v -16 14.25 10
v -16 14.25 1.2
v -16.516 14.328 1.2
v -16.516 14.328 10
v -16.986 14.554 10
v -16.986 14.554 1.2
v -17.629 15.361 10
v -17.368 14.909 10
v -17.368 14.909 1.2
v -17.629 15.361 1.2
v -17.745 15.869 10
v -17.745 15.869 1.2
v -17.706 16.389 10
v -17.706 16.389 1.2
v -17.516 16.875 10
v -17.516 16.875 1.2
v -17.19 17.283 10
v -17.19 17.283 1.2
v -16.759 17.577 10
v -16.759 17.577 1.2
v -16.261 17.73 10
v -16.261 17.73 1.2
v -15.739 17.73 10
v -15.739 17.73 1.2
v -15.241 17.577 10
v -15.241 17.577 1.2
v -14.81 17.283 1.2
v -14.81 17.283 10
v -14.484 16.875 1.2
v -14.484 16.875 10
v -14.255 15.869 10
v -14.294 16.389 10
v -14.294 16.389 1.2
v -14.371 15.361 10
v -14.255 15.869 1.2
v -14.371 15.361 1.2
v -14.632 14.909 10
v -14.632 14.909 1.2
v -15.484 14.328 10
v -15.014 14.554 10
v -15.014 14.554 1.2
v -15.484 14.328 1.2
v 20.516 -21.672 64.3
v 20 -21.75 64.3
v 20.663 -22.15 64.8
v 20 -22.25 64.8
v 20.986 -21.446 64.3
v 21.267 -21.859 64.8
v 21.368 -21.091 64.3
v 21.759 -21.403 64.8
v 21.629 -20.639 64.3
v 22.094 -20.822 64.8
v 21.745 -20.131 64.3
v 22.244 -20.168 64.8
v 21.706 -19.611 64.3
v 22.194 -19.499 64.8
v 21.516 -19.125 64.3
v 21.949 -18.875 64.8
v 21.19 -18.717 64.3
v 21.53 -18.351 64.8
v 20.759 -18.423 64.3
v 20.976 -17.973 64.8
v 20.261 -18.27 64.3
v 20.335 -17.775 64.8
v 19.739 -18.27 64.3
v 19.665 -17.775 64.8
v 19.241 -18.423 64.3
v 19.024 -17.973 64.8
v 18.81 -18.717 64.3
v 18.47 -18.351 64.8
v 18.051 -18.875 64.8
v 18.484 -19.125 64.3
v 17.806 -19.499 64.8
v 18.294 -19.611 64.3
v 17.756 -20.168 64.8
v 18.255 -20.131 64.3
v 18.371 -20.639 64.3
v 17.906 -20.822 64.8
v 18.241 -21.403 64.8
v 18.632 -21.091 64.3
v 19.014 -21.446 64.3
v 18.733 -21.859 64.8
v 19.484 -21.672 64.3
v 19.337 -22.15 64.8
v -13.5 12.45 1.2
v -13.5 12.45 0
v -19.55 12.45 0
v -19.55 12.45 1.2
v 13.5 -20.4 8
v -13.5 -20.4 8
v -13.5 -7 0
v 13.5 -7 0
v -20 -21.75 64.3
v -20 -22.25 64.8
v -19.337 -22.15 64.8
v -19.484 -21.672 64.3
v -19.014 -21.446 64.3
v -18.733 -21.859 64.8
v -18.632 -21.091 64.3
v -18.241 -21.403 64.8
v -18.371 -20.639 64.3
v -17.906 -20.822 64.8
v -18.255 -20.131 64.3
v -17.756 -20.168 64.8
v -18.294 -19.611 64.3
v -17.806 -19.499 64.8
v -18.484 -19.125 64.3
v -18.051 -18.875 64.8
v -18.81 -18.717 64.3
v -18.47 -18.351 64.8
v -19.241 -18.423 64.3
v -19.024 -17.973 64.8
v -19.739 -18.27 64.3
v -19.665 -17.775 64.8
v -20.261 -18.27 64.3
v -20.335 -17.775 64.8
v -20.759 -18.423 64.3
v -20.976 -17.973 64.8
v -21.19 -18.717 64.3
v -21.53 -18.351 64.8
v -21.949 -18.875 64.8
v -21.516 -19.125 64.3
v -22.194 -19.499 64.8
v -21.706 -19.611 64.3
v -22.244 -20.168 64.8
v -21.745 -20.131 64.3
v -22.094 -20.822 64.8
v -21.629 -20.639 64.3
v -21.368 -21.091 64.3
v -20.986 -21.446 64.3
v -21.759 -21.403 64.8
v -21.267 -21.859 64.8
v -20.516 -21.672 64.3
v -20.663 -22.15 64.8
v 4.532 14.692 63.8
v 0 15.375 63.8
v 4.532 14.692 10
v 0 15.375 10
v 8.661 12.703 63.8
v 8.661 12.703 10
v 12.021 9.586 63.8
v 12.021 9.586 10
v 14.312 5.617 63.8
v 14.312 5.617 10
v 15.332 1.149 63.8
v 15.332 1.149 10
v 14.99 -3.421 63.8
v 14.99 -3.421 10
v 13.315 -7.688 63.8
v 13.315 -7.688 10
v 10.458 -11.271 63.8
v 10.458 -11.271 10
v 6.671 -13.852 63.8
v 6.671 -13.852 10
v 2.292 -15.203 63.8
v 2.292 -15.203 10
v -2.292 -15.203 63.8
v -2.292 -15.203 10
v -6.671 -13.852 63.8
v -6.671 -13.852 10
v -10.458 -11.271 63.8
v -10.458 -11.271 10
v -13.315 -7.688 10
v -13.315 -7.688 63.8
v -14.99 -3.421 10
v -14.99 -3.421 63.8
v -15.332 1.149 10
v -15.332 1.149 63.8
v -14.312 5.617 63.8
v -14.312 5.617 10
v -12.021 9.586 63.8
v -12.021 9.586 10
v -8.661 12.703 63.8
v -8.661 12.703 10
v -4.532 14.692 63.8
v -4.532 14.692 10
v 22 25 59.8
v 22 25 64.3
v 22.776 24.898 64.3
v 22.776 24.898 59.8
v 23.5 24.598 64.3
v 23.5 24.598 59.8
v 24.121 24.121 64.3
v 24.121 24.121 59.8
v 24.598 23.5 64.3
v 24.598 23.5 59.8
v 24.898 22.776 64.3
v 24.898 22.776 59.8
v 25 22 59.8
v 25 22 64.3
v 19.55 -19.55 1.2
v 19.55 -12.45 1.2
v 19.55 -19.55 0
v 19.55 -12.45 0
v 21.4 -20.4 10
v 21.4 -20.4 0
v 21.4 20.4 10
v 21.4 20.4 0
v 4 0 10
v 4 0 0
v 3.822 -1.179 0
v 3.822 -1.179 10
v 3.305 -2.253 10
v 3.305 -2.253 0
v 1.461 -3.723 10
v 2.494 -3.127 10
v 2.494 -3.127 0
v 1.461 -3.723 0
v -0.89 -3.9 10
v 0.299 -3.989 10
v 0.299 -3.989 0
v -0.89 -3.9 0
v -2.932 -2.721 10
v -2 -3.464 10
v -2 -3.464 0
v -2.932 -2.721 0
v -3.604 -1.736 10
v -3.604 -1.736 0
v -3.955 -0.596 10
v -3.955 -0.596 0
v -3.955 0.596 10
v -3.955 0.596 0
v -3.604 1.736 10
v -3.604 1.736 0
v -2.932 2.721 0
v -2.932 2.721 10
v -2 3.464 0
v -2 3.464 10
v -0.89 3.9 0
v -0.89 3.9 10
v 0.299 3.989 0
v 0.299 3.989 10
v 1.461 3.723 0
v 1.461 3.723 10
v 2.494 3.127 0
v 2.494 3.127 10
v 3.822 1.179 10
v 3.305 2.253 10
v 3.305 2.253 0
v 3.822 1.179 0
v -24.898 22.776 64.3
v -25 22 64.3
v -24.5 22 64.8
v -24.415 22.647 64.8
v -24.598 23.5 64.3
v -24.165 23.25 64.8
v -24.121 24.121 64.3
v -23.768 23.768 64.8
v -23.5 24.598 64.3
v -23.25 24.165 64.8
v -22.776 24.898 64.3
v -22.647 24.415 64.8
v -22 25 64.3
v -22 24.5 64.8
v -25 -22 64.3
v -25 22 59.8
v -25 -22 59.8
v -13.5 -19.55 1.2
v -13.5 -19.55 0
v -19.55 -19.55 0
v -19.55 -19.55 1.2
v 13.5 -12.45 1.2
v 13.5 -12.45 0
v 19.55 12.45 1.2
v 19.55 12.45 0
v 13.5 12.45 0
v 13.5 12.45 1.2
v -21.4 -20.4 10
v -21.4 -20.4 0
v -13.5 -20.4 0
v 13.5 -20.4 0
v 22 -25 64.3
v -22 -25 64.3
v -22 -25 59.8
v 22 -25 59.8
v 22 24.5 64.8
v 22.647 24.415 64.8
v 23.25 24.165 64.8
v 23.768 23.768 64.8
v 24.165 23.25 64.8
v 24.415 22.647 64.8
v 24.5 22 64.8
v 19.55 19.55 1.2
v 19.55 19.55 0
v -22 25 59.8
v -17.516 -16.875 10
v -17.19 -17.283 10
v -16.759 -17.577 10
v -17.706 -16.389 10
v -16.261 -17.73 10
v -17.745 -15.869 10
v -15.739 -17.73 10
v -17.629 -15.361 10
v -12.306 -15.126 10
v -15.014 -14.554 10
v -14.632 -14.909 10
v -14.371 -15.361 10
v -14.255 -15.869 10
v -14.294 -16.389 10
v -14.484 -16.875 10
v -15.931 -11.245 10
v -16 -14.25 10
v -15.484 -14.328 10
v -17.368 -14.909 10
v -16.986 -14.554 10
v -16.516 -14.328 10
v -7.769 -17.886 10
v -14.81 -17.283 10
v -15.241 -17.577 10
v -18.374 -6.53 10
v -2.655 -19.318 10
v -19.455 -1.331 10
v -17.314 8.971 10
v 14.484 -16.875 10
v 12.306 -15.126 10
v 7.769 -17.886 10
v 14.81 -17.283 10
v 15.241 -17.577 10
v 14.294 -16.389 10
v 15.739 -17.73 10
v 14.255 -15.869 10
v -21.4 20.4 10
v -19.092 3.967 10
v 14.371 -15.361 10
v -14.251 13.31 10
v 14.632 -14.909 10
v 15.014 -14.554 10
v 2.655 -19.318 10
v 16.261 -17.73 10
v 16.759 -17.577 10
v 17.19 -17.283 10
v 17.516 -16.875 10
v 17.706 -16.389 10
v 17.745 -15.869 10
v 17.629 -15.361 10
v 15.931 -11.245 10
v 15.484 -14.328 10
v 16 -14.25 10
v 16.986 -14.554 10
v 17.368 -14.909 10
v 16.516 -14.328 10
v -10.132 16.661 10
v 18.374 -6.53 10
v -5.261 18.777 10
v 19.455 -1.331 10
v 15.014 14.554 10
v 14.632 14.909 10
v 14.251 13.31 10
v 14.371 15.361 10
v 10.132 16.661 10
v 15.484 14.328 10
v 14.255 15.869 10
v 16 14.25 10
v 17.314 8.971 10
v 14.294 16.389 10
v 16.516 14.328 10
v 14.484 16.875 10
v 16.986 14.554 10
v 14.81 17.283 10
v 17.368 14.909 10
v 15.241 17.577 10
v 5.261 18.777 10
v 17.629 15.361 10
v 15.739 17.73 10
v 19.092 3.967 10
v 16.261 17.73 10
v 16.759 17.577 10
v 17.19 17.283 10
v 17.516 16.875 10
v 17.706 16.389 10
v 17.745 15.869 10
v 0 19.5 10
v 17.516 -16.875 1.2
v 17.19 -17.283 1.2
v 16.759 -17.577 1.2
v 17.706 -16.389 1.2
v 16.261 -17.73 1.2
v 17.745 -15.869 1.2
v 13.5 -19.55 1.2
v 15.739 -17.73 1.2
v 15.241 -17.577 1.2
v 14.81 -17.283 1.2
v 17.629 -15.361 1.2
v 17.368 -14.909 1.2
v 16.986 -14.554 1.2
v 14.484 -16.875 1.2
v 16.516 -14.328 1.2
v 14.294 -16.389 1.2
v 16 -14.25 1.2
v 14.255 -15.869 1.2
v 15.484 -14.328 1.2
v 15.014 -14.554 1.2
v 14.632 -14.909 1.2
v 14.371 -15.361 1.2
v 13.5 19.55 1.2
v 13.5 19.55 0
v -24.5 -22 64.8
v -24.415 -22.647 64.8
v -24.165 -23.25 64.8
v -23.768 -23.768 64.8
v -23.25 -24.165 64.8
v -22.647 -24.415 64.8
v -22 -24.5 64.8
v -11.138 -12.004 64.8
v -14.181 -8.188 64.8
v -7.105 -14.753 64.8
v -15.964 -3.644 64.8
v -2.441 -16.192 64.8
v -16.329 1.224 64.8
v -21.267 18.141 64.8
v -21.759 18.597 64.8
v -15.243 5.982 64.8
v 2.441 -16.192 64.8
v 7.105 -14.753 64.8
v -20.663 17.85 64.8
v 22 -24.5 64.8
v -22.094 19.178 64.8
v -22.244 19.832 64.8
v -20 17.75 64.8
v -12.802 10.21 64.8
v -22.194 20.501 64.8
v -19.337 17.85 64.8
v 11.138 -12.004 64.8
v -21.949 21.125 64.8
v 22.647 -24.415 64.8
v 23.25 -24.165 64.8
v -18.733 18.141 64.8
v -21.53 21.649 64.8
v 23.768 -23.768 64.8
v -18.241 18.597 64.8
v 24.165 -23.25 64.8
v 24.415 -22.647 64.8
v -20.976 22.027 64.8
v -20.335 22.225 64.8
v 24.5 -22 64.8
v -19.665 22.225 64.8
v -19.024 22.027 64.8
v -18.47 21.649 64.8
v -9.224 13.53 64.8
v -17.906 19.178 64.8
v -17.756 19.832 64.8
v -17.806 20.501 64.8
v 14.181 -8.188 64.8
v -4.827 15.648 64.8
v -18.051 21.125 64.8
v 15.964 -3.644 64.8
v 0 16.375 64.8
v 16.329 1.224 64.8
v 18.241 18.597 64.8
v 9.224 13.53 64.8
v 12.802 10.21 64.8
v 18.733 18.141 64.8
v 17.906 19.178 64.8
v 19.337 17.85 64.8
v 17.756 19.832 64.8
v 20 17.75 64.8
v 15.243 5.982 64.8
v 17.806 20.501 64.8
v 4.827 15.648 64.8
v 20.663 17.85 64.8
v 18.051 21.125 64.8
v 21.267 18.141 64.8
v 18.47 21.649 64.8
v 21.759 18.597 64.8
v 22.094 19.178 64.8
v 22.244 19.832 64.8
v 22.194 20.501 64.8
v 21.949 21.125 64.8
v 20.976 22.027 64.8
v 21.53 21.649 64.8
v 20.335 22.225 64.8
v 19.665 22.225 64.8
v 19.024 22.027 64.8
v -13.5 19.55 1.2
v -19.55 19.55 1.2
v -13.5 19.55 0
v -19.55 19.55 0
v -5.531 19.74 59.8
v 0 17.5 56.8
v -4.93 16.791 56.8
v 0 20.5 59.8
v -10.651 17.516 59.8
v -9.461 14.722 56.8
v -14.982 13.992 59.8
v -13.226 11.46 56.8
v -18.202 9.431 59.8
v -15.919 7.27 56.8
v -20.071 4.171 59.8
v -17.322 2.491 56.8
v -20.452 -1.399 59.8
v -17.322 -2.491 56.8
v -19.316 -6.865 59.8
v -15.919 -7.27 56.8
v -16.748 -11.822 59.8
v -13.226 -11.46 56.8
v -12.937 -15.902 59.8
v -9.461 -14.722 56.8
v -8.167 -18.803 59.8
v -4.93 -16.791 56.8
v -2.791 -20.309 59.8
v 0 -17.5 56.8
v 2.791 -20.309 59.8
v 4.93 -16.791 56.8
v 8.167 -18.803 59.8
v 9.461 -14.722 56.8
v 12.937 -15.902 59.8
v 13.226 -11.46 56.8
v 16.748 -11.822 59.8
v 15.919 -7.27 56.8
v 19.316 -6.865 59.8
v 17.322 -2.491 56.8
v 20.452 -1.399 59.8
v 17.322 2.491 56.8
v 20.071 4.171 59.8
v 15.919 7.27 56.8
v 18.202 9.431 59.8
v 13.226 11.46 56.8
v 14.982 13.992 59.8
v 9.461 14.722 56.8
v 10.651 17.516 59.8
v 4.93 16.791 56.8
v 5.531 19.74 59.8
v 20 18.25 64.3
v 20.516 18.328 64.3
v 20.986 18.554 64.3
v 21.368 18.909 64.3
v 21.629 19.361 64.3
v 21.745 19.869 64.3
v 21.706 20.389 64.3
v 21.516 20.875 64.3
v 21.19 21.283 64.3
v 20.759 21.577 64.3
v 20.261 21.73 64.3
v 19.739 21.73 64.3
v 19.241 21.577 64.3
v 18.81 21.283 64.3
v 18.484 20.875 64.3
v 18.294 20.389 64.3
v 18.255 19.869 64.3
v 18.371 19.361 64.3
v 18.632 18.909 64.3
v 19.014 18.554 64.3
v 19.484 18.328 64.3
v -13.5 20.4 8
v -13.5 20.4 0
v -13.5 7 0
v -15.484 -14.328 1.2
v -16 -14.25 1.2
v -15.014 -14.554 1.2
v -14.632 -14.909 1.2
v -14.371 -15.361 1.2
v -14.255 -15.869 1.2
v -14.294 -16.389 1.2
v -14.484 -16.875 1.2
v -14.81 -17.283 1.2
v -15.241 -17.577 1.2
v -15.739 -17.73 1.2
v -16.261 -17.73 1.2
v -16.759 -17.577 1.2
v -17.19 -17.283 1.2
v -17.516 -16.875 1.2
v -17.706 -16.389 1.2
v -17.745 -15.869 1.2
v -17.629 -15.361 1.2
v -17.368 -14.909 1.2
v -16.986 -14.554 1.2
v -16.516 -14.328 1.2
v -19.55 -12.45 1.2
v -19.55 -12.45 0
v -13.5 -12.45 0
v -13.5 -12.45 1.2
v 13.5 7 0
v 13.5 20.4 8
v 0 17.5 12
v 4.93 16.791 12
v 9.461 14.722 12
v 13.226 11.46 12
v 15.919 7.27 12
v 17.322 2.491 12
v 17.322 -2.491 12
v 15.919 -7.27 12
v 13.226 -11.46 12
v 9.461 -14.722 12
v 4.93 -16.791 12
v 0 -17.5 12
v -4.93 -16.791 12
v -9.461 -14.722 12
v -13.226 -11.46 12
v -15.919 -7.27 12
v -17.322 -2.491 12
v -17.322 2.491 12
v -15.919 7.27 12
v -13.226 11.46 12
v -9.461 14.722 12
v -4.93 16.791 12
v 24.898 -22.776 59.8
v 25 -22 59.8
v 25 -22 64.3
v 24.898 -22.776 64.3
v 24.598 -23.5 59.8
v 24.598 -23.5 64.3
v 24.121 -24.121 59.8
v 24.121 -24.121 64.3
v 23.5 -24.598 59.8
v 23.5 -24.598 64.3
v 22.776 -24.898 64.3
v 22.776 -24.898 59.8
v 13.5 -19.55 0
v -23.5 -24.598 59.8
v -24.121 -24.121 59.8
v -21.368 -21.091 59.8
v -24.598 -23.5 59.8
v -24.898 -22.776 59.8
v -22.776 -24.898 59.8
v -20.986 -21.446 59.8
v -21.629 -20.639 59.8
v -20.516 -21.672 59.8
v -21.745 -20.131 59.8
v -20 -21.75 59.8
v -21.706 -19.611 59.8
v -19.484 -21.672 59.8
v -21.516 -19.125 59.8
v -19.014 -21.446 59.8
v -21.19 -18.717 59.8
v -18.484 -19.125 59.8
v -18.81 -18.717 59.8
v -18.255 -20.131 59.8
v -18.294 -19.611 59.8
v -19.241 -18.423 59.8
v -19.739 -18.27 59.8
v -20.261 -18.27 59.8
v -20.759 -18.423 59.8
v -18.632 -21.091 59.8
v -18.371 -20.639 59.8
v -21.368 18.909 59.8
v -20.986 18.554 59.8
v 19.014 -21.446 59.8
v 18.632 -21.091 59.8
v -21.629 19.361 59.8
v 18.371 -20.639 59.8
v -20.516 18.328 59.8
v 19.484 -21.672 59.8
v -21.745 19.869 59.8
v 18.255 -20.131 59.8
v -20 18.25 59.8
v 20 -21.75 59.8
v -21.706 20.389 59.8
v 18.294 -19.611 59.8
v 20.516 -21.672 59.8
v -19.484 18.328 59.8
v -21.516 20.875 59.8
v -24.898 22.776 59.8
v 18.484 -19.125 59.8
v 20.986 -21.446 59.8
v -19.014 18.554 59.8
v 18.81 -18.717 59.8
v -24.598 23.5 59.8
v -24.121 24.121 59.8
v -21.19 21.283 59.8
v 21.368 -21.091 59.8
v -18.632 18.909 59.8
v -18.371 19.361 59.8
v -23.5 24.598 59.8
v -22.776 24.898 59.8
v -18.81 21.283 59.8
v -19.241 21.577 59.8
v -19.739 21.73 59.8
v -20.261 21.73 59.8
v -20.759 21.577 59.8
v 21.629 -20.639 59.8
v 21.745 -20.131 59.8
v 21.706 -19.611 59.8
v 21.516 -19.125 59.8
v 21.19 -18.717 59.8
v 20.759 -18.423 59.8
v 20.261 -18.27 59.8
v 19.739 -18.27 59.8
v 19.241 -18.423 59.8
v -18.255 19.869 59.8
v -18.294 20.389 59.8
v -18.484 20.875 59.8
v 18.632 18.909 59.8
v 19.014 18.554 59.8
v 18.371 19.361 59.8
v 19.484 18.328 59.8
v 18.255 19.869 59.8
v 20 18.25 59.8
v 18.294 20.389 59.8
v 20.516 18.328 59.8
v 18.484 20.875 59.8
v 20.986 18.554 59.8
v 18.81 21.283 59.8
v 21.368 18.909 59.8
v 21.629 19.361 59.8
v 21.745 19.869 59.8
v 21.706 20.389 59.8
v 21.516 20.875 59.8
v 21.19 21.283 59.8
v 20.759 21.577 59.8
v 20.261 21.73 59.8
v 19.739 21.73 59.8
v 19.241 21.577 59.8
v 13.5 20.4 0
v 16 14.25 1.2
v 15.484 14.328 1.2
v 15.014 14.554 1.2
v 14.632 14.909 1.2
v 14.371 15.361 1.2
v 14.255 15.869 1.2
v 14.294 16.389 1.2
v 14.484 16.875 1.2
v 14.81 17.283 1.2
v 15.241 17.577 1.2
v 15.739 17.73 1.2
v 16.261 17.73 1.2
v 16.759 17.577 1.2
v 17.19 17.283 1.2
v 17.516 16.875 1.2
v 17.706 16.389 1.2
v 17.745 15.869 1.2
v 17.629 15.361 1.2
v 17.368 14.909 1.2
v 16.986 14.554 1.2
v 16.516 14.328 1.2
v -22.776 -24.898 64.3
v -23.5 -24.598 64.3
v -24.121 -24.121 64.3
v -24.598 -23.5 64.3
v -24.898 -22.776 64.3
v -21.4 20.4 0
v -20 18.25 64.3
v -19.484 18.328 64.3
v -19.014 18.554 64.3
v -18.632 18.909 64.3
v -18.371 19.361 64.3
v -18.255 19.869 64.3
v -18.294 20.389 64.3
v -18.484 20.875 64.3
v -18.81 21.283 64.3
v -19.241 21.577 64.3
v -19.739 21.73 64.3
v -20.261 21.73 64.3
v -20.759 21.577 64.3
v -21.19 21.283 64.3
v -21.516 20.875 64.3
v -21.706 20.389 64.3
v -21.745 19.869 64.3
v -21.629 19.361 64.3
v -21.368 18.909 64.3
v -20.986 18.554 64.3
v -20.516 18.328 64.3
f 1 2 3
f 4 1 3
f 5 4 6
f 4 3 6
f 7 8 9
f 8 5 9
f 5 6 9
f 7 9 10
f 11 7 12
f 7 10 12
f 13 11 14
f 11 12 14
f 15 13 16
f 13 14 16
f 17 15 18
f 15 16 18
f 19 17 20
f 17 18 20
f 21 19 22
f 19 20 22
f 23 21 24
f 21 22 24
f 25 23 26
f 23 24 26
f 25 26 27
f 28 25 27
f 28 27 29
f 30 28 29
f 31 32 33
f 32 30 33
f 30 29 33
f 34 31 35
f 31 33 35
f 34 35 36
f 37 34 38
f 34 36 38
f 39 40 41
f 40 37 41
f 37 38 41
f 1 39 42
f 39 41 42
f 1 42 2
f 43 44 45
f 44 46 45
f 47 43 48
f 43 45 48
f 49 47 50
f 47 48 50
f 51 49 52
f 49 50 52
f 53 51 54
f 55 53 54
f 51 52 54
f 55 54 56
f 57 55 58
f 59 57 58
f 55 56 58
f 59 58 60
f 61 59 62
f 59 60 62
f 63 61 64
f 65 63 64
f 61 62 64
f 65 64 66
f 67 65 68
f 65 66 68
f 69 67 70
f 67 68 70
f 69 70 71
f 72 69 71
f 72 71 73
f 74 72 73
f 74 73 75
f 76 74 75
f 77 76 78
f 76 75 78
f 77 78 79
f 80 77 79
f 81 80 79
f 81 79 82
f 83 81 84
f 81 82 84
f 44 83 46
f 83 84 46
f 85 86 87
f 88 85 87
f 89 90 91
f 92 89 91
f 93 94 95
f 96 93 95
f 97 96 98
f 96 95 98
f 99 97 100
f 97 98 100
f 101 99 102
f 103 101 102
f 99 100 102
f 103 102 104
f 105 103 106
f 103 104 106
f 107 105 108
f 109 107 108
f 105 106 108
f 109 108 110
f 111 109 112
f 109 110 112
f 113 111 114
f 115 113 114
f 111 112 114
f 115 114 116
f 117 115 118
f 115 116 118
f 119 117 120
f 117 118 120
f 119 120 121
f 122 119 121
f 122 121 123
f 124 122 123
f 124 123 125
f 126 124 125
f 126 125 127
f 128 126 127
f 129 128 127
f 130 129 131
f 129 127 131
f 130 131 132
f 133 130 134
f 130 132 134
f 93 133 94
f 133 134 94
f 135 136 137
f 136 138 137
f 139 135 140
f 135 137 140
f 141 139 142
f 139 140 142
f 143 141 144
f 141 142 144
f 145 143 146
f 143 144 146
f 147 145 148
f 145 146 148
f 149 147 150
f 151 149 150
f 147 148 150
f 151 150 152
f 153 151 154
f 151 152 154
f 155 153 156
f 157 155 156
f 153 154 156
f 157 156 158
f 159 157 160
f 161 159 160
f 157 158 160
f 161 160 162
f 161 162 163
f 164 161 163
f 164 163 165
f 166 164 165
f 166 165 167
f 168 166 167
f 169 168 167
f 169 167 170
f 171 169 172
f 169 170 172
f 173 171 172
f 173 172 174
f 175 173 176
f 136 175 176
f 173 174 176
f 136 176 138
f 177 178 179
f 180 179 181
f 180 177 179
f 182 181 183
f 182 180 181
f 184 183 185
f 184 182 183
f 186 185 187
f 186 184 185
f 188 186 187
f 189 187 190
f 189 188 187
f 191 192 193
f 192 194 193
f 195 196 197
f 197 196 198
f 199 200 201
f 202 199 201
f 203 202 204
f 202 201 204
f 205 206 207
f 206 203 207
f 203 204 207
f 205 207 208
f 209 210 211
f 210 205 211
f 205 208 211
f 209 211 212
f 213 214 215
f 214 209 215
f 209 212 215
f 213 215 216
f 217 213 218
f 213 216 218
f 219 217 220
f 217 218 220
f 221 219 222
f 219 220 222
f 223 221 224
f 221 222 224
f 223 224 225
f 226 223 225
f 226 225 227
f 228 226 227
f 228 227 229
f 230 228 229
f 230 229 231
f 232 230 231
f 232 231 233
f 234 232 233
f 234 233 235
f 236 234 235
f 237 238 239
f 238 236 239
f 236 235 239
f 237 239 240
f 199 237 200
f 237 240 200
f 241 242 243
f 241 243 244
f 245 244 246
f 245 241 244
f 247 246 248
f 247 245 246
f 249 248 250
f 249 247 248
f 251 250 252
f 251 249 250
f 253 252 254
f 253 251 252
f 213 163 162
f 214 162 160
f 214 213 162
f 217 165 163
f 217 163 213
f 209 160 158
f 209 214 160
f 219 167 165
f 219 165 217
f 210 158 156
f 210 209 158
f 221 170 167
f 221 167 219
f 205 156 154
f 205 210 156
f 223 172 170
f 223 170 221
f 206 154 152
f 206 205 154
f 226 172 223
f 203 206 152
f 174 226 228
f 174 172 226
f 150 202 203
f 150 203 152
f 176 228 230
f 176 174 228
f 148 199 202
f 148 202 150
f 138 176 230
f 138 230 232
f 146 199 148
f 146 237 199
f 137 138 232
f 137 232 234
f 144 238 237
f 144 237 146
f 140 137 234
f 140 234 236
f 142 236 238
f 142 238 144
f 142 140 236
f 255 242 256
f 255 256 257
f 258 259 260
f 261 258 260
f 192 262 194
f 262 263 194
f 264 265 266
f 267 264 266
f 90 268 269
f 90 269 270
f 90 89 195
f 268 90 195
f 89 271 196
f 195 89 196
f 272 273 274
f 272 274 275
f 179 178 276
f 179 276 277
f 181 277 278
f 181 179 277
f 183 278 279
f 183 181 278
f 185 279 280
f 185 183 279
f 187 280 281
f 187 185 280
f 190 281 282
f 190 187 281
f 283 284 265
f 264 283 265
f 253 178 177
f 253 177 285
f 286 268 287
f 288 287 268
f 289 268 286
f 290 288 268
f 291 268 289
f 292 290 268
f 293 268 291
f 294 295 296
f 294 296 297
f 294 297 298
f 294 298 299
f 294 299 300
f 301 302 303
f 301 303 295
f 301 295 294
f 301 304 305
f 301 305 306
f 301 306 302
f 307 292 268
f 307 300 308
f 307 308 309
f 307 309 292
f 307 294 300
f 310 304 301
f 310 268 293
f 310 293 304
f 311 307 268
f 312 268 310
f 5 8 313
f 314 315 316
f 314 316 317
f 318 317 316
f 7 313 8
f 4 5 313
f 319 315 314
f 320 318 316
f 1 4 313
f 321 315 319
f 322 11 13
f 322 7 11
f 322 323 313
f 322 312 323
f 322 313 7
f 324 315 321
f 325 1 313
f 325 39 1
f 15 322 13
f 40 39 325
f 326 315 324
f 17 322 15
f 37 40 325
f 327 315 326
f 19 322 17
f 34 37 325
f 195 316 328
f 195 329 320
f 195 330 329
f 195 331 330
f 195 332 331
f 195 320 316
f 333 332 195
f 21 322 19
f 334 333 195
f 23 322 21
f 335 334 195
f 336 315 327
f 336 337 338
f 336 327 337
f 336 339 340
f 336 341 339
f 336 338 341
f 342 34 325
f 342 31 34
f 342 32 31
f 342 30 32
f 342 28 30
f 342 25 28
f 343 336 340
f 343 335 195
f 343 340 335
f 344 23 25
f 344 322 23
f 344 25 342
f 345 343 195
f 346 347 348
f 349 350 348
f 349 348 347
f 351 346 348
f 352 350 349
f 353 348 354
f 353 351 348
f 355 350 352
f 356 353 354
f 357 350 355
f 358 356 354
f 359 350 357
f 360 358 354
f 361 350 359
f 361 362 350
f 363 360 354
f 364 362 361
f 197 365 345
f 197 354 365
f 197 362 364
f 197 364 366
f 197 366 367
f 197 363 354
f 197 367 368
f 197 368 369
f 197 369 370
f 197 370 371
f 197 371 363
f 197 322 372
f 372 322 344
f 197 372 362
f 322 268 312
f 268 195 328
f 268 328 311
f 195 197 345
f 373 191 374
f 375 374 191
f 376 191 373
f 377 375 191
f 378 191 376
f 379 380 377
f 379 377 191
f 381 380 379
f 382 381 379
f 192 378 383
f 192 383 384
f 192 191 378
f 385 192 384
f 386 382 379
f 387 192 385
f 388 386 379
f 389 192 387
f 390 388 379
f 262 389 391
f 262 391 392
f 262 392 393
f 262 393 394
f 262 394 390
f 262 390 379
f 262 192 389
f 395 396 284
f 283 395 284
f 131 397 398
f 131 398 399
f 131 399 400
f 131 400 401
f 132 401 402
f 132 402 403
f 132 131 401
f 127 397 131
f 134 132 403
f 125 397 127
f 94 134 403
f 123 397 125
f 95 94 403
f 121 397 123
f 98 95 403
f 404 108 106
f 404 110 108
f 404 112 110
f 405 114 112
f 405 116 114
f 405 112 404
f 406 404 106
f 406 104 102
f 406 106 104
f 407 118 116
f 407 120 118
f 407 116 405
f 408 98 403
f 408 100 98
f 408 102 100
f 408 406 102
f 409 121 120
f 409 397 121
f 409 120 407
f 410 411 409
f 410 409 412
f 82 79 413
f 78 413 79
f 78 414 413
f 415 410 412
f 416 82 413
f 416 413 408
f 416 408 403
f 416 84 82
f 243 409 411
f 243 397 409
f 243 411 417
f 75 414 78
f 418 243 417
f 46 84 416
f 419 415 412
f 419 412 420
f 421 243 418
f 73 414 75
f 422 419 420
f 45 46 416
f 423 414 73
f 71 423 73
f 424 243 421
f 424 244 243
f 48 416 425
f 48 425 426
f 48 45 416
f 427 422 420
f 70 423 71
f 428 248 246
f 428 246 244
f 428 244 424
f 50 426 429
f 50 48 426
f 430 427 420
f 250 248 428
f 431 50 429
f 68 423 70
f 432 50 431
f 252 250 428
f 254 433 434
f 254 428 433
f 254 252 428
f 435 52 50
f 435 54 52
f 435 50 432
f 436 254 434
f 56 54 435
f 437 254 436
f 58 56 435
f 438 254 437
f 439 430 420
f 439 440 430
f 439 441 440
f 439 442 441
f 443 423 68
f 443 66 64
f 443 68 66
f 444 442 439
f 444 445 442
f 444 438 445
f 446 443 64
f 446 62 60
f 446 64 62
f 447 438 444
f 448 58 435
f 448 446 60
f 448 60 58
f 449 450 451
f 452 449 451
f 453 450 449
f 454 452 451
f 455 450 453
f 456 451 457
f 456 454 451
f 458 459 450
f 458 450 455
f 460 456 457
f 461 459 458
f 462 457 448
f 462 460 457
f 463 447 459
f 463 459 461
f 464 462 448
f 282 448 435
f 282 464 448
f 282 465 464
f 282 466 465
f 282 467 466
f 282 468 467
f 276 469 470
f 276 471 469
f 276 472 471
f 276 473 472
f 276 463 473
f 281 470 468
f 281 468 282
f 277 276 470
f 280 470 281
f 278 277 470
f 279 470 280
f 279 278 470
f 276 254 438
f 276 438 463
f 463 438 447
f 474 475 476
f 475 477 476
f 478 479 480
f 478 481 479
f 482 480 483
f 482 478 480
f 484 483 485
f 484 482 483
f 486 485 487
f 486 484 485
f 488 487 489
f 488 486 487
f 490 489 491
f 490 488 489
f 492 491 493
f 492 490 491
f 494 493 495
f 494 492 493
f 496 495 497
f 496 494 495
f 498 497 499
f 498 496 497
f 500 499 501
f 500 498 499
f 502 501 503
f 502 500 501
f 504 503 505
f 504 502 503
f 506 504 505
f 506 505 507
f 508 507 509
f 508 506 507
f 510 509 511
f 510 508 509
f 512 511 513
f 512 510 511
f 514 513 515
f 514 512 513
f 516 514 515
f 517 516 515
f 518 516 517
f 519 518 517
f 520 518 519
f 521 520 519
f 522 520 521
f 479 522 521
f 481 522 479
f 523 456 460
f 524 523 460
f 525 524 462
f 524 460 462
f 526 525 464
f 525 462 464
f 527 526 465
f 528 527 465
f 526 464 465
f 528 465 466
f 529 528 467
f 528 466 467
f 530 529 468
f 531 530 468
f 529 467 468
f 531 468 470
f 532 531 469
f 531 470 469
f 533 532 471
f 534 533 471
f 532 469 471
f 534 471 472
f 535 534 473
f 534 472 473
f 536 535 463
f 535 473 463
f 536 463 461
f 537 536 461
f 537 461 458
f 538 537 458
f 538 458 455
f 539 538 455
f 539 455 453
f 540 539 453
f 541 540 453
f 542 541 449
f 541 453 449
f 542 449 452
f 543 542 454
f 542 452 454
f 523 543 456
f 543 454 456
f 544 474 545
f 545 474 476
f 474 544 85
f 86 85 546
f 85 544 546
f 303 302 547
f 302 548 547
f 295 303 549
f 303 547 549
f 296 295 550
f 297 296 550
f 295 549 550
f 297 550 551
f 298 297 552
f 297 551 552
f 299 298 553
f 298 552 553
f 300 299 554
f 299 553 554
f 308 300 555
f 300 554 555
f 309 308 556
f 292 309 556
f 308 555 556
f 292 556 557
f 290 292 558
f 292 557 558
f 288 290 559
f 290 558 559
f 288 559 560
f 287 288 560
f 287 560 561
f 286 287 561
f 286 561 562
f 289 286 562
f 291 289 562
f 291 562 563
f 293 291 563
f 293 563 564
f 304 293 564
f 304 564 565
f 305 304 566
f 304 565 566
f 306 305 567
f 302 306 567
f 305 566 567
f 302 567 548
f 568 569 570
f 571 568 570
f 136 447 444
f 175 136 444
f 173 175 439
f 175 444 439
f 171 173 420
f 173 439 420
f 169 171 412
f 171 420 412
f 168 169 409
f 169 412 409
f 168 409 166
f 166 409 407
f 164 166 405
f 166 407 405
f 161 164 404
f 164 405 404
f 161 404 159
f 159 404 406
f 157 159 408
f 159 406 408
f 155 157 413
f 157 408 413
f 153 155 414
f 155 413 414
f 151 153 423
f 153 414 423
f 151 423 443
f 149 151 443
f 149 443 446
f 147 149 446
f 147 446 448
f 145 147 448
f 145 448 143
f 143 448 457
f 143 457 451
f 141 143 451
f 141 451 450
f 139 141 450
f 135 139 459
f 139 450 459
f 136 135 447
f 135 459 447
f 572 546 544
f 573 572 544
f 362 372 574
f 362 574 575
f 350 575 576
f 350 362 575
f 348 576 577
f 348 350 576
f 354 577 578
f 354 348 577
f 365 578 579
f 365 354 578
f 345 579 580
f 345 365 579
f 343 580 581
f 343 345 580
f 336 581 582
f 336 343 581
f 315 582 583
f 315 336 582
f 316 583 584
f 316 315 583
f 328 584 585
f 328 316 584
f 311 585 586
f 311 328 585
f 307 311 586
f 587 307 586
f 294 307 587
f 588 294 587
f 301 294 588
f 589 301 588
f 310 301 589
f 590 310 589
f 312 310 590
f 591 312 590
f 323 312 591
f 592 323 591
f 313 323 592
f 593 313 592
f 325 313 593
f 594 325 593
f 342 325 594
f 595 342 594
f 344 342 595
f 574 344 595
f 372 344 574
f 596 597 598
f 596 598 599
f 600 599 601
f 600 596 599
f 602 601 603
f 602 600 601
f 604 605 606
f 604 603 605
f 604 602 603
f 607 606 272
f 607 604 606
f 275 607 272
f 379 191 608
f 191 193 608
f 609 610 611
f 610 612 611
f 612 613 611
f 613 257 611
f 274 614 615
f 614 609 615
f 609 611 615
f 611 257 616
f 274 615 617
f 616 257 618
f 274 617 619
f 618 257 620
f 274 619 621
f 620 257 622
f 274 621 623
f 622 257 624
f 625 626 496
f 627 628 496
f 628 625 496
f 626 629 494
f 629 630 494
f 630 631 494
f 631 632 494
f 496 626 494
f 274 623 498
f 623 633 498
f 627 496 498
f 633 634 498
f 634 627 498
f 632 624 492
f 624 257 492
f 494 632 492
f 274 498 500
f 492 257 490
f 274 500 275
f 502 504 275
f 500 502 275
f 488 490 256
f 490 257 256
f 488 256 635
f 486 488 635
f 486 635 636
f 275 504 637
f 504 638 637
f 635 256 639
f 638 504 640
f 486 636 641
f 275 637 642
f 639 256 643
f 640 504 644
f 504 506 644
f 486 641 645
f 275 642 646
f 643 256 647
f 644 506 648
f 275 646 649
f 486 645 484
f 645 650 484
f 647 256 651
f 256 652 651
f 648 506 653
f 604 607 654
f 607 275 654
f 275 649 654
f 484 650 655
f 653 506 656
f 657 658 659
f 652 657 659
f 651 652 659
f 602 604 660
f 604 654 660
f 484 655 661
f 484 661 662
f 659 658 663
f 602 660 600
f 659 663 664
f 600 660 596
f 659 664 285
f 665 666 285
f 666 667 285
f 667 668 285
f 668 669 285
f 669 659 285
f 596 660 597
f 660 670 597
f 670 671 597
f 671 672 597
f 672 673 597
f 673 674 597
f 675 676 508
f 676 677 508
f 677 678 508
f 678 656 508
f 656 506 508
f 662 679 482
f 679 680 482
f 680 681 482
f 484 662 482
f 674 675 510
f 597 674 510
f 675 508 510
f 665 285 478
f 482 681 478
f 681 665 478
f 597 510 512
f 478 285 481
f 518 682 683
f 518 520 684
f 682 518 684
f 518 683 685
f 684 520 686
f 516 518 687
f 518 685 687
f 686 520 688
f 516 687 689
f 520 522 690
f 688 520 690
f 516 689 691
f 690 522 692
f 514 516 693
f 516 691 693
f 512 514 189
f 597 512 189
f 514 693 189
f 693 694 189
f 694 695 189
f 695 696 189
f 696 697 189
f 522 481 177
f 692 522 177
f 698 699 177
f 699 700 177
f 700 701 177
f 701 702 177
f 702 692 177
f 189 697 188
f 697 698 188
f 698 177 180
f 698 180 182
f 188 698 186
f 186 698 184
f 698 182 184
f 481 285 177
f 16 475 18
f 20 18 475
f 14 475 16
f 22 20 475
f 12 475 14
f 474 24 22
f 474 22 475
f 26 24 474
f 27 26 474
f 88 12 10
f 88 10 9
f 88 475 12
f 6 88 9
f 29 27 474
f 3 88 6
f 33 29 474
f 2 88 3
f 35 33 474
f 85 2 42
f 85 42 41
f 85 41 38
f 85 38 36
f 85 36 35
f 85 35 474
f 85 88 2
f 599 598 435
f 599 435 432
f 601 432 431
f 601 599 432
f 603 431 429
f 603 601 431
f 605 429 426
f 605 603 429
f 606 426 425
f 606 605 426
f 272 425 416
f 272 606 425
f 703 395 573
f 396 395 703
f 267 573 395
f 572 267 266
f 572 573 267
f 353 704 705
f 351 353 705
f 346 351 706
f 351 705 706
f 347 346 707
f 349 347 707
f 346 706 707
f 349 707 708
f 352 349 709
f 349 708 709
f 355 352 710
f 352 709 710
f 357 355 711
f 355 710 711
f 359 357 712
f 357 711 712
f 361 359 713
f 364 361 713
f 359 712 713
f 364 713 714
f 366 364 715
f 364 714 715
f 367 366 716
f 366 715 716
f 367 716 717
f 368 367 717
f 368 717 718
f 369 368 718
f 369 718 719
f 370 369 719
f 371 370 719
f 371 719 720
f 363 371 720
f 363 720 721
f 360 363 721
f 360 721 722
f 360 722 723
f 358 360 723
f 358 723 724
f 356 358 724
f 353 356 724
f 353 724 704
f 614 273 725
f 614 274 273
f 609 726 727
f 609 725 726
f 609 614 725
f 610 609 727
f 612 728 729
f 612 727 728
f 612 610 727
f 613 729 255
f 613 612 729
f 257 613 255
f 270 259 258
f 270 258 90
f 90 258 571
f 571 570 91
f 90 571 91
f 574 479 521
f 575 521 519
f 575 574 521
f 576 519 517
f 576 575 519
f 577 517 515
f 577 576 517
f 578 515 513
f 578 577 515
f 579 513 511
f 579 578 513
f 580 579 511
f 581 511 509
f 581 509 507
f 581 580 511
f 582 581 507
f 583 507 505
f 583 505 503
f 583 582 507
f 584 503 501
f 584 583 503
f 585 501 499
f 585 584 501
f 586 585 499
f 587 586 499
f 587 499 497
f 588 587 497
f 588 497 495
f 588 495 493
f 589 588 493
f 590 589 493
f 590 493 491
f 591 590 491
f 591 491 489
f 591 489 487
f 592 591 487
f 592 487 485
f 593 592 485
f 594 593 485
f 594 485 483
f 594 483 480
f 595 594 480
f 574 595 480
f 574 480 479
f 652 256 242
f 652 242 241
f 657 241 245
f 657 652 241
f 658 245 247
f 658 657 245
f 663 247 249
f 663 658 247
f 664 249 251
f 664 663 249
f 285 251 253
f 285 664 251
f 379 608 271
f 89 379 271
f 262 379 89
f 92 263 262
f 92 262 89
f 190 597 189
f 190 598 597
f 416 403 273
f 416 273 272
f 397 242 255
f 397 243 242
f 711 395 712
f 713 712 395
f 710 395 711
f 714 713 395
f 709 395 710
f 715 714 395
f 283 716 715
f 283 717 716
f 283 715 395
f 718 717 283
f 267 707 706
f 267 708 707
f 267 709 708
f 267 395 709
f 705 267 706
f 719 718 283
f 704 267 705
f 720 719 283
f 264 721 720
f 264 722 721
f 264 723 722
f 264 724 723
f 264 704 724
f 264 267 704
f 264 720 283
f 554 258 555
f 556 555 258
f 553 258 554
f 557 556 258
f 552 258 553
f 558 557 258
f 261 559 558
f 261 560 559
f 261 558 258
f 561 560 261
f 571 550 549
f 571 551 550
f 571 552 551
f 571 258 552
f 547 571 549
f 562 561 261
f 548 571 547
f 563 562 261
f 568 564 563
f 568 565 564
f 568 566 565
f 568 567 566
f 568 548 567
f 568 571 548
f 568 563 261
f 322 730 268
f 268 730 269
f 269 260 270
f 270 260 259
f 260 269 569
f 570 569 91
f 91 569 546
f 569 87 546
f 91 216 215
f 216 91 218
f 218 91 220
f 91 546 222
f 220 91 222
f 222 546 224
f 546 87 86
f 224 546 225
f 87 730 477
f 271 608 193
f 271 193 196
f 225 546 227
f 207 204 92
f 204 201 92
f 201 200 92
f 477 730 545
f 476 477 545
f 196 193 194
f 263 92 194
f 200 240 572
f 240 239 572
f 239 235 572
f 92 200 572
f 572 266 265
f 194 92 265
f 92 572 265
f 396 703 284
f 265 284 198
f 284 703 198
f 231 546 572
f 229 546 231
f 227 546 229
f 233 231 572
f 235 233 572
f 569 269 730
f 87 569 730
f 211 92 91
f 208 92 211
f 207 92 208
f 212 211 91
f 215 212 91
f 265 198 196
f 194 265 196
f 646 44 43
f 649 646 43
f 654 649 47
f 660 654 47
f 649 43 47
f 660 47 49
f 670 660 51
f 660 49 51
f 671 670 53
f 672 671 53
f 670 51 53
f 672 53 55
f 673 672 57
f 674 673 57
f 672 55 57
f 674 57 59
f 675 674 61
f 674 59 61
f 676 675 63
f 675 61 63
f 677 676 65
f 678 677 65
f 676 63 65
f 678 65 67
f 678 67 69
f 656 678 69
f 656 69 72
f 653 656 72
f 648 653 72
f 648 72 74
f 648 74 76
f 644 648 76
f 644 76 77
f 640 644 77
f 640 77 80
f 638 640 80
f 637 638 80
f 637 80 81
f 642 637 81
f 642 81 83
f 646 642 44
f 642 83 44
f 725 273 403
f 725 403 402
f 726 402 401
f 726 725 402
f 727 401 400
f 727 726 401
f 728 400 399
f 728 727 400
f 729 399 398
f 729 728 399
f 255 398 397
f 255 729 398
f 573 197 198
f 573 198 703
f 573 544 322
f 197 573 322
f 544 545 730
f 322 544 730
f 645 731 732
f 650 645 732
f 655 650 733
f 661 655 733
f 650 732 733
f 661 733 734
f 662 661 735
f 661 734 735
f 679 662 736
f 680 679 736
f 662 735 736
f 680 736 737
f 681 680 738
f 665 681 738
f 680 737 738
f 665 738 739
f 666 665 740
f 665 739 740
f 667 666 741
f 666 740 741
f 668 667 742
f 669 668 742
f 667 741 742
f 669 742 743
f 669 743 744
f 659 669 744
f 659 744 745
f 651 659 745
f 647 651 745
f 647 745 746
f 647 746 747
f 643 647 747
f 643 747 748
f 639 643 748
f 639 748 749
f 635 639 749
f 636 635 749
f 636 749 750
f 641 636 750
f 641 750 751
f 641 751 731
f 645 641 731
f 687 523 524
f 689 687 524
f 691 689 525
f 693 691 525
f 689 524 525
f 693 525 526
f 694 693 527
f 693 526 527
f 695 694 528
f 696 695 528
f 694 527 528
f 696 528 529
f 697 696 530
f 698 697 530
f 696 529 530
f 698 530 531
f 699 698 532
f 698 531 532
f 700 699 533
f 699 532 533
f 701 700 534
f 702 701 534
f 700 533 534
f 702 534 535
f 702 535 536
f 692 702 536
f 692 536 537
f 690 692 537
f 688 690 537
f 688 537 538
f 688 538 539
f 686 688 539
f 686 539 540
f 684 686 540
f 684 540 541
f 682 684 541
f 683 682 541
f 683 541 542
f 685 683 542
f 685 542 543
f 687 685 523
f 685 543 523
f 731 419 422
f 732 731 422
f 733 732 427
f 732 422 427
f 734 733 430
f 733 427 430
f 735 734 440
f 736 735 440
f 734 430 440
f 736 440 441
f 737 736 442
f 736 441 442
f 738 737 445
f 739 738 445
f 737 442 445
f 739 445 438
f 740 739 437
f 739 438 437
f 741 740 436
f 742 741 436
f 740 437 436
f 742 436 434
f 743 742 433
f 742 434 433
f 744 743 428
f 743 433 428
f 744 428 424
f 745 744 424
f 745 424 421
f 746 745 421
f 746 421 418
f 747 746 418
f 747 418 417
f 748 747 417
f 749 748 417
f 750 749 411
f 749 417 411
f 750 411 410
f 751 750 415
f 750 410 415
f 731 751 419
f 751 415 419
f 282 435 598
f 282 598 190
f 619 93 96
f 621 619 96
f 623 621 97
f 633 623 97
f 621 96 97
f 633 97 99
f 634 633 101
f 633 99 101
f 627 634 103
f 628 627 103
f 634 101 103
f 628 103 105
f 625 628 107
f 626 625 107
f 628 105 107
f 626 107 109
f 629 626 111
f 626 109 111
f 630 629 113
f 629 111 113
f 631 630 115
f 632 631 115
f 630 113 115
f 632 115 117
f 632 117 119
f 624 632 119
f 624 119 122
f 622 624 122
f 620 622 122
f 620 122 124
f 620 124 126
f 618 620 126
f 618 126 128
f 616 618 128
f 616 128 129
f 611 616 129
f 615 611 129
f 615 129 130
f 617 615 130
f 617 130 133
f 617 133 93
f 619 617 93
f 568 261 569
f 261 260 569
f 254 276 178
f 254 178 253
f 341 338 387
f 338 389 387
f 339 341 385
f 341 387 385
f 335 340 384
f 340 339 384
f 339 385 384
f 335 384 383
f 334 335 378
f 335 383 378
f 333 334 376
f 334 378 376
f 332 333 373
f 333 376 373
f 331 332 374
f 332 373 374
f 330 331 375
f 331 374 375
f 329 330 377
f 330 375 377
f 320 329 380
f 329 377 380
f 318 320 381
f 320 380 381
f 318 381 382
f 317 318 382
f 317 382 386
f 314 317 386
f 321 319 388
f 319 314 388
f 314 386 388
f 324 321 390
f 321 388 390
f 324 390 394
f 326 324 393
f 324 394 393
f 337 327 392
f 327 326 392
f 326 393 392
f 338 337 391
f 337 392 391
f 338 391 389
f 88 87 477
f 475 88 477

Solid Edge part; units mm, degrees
sketch "Sketch1" plane through (0, 0, 0) normal (0, 0, 1) x (1, 0, 0)
  line L0 (-21.4, -20.4) -> (21.4, -20.4)
  line L1 (21.4, -20.4) -> (21.4, 20.4)
  line L2 (21.4, 20.4) -> (-21.4, 20.4)
  line L3 (-21.4, 20.4) -> (-21.4, -20.4)
  circle A0 centre (0, 0) radius 4
extrude "Extrusionsausprägung_20" add sketch "Sketch1" along normal blind 10
sketch "Sketch2" plane through (0, 0, 0) normal (0, 0, -1) x (0, -1, 0)
  line L0 (19.55, 19.55) -> (12.45, 19.55)
  line L1 (12.45, 19.55) -> (12.45, 12.45)
  line L2 (12.45, 12.45) -> (19.55, 12.45)
  line L3 (19.55, 12.45) -> (19.55, 19.55)
extrude "Extrusionsausschnitt_24" cut sketch "Sketch2" against normal blind 1.2
hole "Bohrung_4" at (-16, -16, 0) direction (0, 0, 1) diameter 3.5 end up to next
mirror "Mirror1" about plane through (0, 0, 0) normal (0, -1, 0) of "Extrusionsausschnitt_24", "Bohrung_4"
mirror "Mirror2" about plane through (0, 0, 0) normal (1, 0, 0) of "Extrusionsausschnitt_24", "Bohrung_4", "Mirror1"
sketch "Sketch3" plane through (0, 0, 0) normal (1, 0, 0) x (0, 1, 0)
  line L0 (20.4, 0) -> (7, 0)
  line L1 (7, 0) -> (20.4, 8)
  line L2 (20.4, 8) -> (20.4, 0)
extrude "Extrusionsausschnitt_25" cut sketch "Sketch3" along normal mid plane 27
mirror "Mirror3" about plane through (0, 0, 0) normal (0, -1, 0) of "Extrusionsausschnitt_25"
sketch "Sketch4" plane through (0, 0, 10) normal (0, 0, 1) x (0, 1, 0)
  circle A0 centre (0, 0) radius 15.375
  circle A1 centre (0, 0) radius 17.5
extrude "Extrusionsausprägung_21" add sketch "Sketch4" along normal blind 54.8
chamfer "Fase_9" distance 2 angle 45 1 edges at (0, -17.5, 10)
sketch "Sketch5" plane through (0, 0, 64.8) normal (0, 0, 1) x (-1, 0, 0)
  line L0 (-25, 25) -> (-25, -25)
  line L1 (-25, -25) -> (25, -25)
  line L2 (25, -25) -> (25, 25)
  line L3 (25, 25) -> (-25, 25)
  circle A0 centre (0, 0) radius 15.375
extrude "Extrusionsausprägung_23" add sketch "Sketch5" against normal blind 5
chamfer "Fase_10" distance 3 angle 45 1 edges at (-17.5, 0, 59.8)
sketch "Sketch6" plane through (0, 0, 64.8) normal (0, 0, 1) x (0, -1, 0)
  circle A0 centre (-20, 20) radius 1.75
  circle A1 centre (-20, -20) radius 1.75
  circle A2 centre (20, -20) radius 1.75
  circle A3 centre (20, 20) radius 1.75
extrude "Extrusionsausschnitt_26" cut sketch "Sketch6" against normal blind 27
fillet "Verrundung_16" radius 3 4 edges at (-25, -25, 62.3) (25, -25, 62.3) (-25, 25, 62.3) (25, 25, 62.3)
chamfer "Fase_11" distance 0.5 angle 45 12 edges at (20, 21.75, 64.8) (-20, 21.75, 64.8) (-20, -18.25, 64.8) (20, -18.25, 64.8) (25, 0, 64.8) (24.1213, 24.1213, 64.8) (0, 25, 64.8) (-24.1213, 24.1213, 64.8) (-25, 0, 64.8) (-24.1213, -24.1213, 64.8) (0, -25, 64.8) (24.1213, -24.1213, 64.8)
chamfer "Fase_12" distance 1 angle 45 1 edges at (0, -15.375, 64.8)
